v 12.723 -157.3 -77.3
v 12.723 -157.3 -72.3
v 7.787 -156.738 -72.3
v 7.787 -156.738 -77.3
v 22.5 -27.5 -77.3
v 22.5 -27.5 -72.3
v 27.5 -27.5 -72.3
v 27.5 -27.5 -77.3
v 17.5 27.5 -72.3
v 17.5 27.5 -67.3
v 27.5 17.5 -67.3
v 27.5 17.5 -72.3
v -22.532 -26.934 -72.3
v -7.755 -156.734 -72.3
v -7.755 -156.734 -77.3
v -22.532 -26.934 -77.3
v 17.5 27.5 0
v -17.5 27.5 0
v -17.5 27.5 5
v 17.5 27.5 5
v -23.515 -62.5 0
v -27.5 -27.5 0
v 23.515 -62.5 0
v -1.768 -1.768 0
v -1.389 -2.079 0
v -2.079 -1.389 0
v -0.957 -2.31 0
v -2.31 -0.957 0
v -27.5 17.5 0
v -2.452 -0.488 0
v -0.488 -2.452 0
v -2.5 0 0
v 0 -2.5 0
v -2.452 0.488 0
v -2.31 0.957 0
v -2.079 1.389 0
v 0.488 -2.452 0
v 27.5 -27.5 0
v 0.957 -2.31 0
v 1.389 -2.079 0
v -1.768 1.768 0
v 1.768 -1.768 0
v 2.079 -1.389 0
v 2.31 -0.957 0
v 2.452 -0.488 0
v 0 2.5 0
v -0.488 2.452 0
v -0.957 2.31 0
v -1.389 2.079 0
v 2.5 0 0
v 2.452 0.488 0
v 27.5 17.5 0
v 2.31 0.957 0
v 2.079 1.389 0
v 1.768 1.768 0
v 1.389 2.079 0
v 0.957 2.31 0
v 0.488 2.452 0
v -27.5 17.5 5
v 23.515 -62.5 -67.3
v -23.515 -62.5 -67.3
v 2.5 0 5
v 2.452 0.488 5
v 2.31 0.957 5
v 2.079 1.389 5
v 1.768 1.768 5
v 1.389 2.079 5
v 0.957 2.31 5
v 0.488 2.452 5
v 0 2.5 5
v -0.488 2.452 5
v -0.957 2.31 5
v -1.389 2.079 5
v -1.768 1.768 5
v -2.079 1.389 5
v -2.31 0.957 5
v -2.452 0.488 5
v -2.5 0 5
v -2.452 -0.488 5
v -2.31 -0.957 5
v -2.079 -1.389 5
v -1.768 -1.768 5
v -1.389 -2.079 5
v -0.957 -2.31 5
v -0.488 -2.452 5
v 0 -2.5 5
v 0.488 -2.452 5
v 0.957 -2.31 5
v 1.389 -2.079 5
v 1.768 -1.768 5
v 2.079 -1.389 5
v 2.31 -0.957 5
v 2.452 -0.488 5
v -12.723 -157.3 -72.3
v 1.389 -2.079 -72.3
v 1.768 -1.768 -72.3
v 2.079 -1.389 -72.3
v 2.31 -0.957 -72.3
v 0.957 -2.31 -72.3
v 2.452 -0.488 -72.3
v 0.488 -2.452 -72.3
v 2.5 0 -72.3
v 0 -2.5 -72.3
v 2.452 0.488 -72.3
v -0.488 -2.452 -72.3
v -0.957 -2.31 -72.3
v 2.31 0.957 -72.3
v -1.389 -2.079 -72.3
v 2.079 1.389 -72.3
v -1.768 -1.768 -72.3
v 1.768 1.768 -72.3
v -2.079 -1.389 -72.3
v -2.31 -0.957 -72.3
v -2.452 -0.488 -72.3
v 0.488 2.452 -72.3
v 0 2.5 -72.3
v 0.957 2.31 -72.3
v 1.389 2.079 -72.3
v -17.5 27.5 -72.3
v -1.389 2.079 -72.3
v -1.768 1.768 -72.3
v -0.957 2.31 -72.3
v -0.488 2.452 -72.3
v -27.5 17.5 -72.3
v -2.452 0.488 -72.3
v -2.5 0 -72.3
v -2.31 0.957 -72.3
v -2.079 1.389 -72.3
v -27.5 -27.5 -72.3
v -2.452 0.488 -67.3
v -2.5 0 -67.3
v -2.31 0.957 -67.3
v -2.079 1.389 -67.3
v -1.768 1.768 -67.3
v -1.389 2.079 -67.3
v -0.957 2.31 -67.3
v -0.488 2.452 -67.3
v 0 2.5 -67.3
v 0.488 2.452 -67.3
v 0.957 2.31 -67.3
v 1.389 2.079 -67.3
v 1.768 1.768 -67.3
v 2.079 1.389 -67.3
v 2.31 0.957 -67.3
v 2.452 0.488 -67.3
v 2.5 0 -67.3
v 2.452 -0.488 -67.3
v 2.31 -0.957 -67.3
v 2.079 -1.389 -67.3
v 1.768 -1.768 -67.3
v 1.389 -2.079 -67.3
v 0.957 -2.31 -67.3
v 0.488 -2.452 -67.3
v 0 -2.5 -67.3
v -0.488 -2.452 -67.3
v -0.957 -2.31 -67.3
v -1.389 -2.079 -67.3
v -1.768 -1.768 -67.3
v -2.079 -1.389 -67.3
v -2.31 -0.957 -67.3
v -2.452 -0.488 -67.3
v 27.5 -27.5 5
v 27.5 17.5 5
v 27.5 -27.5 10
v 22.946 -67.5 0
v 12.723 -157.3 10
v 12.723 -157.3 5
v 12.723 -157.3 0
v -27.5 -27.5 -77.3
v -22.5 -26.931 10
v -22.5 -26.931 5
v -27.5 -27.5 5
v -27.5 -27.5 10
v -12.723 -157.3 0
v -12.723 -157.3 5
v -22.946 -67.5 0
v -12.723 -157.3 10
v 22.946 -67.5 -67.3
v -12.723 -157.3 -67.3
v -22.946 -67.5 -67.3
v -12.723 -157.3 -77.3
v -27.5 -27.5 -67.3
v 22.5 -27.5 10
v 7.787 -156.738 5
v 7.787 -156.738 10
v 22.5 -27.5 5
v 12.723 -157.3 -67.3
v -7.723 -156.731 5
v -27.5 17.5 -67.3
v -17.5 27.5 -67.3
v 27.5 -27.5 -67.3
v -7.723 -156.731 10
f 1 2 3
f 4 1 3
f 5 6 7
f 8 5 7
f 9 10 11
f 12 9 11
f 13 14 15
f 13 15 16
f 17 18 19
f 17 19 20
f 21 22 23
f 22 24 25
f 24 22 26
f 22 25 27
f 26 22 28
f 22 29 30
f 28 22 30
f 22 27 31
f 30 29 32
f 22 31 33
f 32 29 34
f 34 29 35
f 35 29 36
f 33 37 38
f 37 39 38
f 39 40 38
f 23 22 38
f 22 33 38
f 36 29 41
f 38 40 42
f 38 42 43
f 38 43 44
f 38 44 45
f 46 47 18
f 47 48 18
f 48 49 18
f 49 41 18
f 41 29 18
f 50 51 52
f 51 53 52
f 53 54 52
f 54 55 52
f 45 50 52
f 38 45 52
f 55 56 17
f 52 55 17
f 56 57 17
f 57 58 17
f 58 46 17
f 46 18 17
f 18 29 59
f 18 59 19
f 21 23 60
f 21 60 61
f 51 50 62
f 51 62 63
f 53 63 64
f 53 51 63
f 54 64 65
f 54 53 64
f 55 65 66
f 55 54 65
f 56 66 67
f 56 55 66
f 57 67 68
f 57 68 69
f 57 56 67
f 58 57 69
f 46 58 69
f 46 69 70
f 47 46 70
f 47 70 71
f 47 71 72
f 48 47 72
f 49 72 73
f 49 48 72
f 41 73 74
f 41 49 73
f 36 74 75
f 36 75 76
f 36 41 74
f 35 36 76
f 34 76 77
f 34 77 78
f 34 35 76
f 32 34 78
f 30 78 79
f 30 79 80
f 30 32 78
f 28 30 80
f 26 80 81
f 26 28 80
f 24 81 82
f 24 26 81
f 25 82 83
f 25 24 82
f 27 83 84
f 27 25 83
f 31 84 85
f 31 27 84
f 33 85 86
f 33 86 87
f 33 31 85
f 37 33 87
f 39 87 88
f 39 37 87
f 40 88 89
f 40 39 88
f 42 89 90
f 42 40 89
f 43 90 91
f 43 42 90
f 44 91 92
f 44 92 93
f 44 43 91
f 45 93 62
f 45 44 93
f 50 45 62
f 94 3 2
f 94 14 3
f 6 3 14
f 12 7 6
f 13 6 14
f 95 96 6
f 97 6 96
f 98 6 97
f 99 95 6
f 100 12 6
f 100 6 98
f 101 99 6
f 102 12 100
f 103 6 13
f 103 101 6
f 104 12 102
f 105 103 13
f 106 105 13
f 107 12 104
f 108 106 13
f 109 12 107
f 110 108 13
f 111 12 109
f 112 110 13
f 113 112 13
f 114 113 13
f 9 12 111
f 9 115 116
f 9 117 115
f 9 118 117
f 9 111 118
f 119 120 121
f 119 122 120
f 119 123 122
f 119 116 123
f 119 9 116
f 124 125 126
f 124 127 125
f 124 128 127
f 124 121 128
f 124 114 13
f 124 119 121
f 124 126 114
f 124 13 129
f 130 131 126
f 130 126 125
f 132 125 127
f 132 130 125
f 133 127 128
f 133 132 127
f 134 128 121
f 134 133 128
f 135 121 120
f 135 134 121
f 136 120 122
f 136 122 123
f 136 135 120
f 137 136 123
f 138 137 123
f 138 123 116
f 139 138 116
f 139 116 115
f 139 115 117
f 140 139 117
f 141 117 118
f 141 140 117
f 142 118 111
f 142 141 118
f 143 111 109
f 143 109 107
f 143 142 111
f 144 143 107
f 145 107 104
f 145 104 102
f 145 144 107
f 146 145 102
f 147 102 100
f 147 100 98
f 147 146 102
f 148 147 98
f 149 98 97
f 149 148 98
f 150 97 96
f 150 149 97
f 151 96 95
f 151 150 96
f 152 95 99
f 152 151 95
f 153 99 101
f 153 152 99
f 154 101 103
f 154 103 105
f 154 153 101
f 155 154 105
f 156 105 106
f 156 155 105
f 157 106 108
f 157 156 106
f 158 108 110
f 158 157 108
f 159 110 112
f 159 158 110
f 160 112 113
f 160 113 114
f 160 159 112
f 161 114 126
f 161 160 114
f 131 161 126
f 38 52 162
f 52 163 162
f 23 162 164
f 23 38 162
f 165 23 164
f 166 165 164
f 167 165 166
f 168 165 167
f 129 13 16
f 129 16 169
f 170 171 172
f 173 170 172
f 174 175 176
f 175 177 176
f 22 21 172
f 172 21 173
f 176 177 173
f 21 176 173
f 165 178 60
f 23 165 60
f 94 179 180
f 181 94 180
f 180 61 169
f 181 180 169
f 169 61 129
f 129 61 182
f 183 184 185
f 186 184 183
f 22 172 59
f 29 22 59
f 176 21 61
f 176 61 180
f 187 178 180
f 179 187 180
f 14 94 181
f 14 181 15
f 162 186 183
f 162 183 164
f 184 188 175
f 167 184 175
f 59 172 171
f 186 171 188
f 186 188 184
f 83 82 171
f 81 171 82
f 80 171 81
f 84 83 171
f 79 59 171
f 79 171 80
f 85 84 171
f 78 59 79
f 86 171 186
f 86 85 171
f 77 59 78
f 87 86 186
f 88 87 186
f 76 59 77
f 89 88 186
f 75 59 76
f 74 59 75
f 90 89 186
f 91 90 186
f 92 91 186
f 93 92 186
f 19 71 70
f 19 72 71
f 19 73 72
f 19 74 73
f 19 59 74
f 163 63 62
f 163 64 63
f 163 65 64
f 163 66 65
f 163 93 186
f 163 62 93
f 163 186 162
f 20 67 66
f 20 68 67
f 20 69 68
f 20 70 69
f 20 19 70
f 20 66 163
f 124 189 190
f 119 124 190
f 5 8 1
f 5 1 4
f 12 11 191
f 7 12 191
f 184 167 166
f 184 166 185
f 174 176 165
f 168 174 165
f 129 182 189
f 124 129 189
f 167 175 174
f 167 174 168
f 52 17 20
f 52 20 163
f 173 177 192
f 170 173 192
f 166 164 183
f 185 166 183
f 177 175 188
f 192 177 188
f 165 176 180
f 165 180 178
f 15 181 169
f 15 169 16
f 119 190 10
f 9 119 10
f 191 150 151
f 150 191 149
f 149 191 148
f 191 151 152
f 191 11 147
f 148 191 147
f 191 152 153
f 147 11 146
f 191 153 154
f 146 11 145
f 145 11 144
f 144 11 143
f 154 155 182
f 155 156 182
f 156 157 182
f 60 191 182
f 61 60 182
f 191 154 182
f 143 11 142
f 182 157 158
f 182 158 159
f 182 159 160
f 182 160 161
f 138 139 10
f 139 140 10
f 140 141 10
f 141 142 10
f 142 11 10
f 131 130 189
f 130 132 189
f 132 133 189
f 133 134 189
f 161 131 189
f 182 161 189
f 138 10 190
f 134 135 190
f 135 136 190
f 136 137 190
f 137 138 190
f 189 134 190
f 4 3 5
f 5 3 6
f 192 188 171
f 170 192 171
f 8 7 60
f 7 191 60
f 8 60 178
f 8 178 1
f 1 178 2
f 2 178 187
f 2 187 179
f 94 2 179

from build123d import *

# Parameters (mm, degrees)
SKETCH1_R           = 2.5
BOSS_EXTRUDE1_DEPTH = 5
SKETCH3_W           = 55
SKETCH3_H           = 5
BOSS_EXTRUDE2_DEPTH = 129.8
SKETCH4_W           = 55
SKETCH4_H           = 5
BOSS_EXTRUDE3_DEPTH = 67.3
SKETCH5_R           = 2.5
BOSS_EXTRUDE4_DEPTH = 5
CUT_EXTRUDE2_REACH  = 79.3
SKETCH7_W           = 0.569216758
SKETCH7_H           = 67.3
CUT_EXTRUDE3_DEPTH  = 5
CUT_EXTRUDE4_REACH  = 166.8
SKETCH8_W           = 30
SKETCH8_H           = 67.3
BOSS_EXTRUDE5_REACH = 74.3
BOSS_EXTRUDE6_DEPTH = 5
BOSS_EXTRUDE7_DEPTH = 5


with BuildPart() as part:
    # Sketch1 → Boss-Extrude1 (new body)
    with BuildSketch(Plane.XY):
        Polygon((-27.5, 17.5), (-17.5, 27.5), (17.5, 27.5), (27.5, 17.5), (27.5, -27.5), (-27.5, -27.5), align=None)
        Circle(SKETCH1_R, mode=Mode.SUBTRACT)
    extrude(amount=BOSS_EXTRUDE1_DEPTH)

    # Sketch3 → Boss-Extrude2 (add)
    with BuildSketch(Plane.XZ.offset(27.5)):
        with Locations((0, 2.5)):
            Rectangle(SKETCH3_W, SKETCH3_H)
    extrude(amount=BOSS_EXTRUDE2_DEPTH)

    # Sketch4 → Boss-Extrude3 (add)
    with BuildSketch(Plane(origin=(0, 0, 0), x_dir=(-1, 0, 0), z_dir=(0, 0, -1))):
        with Locations((0, -134.8)):
            Rectangle(SKETCH4_W, SKETCH4_H)
    extrude(amount=BOSS_EXTRUDE3_DEPTH)

    # Sketch5 → Boss-Extrude4 (add)
    with BuildSketch(Plane(origin=(0, 0, -67.3), x_dir=(-1, 0, 0), z_dir=(0, 0, -1))):
        Polygon((-27.5, -157.3), (27.5, -157.3), (27.5, 17.5), (17.5, 27.5), (-17.5, 27.5), (-27.5, 17.5), align=None)
        Circle(SKETCH5_R, mode=Mode.SUBTRACT)
    extrude(amount=BOSS_EXTRUDE4_DEPTH)

    # Sketch6 → Cut-Extrude2 (cut, up to next)
    with BuildSketch(Plane.XY.offset(5), mode=Mode.PRIVATE) as cut_extrude2_sk1:
        Polygon((-12.723132969, -157.3), (-27.5, -27.5), (-27.5, -157.3), align=None)
    cut_extrude2_tool1 = extrude(cut_extrude2_sk1.sketch, amount=-CUT_EXTRUDE2_REACH, mode=Mode.PRIVATE) & part.part
    add(cut_extrude2_tool1.solids().sort_by_distance((-22.574378, -114.033333, 5))[0], mode=Mode.SUBTRACT)
    # Sketch6 → Cut-Extrude2 (cut, up to next)
    with BuildSketch(Plane.XY.offset(5), mode=Mode.PRIVATE) as cut_extrude2_sk2:
        Polygon((27.5, -27.5), (12.723132969, -157.3), (27.5, -157.3), align=None)
    cut_extrude2_tool2 = extrude(cut_extrude2_sk2.sketch, amount=-CUT_EXTRUDE2_REACH, mode=Mode.PRIVATE) & part.part
    add(cut_extrude2_tool2.solids().sort_by_distance((22.574378, -114.033333, 5))[0], mode=Mode.SUBTRACT)

    # Sketch7 → Cut-Extrude3 (cut)
    with BuildSketch(Plane.XZ.offset(137.3)):
        with Locations((-15.284608379, -33.65)):
            Rectangle(SKETCH7_W, SKETCH7_H)
        with Locations((15.284608379, -33.65)):
            Rectangle(SKETCH7_W, SKETCH7_H)
    extrude(amount=-CUT_EXTRUDE3_DEPTH, mode=Mode.SUBTRACT)

    # Sketch8 → Cut-Extrude4 (cut, up to next)
    with BuildSketch(Plane.XZ.offset(137.3), mode=Mode.PRIVATE) as cut_extrude4_sk1:
        with Locations((0, -33.65)):
            Rectangle(SKETCH8_W, SKETCH8_H)
    cut_extrude4_tool1 = extrude(cut_extrude4_sk1.sketch, amount=-CUT_EXTRUDE4_REACH, mode=Mode.PRIVATE) & part.part
    add(cut_extrude4_tool1.solids().sort_by_distance((0, -137.3, -33.65))[0], mode=Mode.SUBTRACT)

    # Sketch9 → Boss-Extrude5 (add, up to next)
    with BuildSketch(Plane(origin=(0, 0, 0), x_dir=(-1, 0, 0), z_dir=(0, 0, -1)), mode=Mode.PRIVATE) as boss_extrude5_sk1:
        Polygon((-23.515482696, -62.5), (23.515482696, -62.5), (22.946265938, -67.5), (-22.946265938, -67.5), align=None)
    boss_extrude5_tool1 = extrude(boss_extrude5_sk1.sketch, amount=BOSS_EXTRUDE5_REACH, mode=Mode.PRIVATE) - part.part
    add(boss_extrude5_tool1.solids().sort_by_distance((0, -64.989791, 0))[0])

    # Sketch10 → Boss-Extrude6 (add)
    with BuildSketch(Plane.XY.offset(5)):
        Polygon((27.5, -27.5), (12.723132969, -157.3), (7.78710541, -156.738066079), (22.5, -27.5), align=None)
        Polygon((-27.5, -27.5), (-12.723132969, -157.3), (-7.723132969, -156.730783242), (-22.5, -26.930783242), align=None)
    extrude(amount=BOSS_EXTRUDE6_DEPTH)

    # Sketch11 → Boss-Extrude7 (add)
    with BuildSketch(Plane(origin=(0, 0, -72.3), x_dir=(-1, 0, 0), z_dir=(0, 0, -1))):
        Polygon((-27.5, -27.5), (-12.723132969, -157.3), (-7.78710541, -156.738066079), (-22.5, -27.5), align=None)
        Polygon((27.5, -27.5), (12.723132969, -157.3), (7.755222161, -156.734436383), (22.532089192, -26.934436383), align=None)
    extrude(amount=BOSS_EXTRUDE7_DEPTH)


solid = part.part
